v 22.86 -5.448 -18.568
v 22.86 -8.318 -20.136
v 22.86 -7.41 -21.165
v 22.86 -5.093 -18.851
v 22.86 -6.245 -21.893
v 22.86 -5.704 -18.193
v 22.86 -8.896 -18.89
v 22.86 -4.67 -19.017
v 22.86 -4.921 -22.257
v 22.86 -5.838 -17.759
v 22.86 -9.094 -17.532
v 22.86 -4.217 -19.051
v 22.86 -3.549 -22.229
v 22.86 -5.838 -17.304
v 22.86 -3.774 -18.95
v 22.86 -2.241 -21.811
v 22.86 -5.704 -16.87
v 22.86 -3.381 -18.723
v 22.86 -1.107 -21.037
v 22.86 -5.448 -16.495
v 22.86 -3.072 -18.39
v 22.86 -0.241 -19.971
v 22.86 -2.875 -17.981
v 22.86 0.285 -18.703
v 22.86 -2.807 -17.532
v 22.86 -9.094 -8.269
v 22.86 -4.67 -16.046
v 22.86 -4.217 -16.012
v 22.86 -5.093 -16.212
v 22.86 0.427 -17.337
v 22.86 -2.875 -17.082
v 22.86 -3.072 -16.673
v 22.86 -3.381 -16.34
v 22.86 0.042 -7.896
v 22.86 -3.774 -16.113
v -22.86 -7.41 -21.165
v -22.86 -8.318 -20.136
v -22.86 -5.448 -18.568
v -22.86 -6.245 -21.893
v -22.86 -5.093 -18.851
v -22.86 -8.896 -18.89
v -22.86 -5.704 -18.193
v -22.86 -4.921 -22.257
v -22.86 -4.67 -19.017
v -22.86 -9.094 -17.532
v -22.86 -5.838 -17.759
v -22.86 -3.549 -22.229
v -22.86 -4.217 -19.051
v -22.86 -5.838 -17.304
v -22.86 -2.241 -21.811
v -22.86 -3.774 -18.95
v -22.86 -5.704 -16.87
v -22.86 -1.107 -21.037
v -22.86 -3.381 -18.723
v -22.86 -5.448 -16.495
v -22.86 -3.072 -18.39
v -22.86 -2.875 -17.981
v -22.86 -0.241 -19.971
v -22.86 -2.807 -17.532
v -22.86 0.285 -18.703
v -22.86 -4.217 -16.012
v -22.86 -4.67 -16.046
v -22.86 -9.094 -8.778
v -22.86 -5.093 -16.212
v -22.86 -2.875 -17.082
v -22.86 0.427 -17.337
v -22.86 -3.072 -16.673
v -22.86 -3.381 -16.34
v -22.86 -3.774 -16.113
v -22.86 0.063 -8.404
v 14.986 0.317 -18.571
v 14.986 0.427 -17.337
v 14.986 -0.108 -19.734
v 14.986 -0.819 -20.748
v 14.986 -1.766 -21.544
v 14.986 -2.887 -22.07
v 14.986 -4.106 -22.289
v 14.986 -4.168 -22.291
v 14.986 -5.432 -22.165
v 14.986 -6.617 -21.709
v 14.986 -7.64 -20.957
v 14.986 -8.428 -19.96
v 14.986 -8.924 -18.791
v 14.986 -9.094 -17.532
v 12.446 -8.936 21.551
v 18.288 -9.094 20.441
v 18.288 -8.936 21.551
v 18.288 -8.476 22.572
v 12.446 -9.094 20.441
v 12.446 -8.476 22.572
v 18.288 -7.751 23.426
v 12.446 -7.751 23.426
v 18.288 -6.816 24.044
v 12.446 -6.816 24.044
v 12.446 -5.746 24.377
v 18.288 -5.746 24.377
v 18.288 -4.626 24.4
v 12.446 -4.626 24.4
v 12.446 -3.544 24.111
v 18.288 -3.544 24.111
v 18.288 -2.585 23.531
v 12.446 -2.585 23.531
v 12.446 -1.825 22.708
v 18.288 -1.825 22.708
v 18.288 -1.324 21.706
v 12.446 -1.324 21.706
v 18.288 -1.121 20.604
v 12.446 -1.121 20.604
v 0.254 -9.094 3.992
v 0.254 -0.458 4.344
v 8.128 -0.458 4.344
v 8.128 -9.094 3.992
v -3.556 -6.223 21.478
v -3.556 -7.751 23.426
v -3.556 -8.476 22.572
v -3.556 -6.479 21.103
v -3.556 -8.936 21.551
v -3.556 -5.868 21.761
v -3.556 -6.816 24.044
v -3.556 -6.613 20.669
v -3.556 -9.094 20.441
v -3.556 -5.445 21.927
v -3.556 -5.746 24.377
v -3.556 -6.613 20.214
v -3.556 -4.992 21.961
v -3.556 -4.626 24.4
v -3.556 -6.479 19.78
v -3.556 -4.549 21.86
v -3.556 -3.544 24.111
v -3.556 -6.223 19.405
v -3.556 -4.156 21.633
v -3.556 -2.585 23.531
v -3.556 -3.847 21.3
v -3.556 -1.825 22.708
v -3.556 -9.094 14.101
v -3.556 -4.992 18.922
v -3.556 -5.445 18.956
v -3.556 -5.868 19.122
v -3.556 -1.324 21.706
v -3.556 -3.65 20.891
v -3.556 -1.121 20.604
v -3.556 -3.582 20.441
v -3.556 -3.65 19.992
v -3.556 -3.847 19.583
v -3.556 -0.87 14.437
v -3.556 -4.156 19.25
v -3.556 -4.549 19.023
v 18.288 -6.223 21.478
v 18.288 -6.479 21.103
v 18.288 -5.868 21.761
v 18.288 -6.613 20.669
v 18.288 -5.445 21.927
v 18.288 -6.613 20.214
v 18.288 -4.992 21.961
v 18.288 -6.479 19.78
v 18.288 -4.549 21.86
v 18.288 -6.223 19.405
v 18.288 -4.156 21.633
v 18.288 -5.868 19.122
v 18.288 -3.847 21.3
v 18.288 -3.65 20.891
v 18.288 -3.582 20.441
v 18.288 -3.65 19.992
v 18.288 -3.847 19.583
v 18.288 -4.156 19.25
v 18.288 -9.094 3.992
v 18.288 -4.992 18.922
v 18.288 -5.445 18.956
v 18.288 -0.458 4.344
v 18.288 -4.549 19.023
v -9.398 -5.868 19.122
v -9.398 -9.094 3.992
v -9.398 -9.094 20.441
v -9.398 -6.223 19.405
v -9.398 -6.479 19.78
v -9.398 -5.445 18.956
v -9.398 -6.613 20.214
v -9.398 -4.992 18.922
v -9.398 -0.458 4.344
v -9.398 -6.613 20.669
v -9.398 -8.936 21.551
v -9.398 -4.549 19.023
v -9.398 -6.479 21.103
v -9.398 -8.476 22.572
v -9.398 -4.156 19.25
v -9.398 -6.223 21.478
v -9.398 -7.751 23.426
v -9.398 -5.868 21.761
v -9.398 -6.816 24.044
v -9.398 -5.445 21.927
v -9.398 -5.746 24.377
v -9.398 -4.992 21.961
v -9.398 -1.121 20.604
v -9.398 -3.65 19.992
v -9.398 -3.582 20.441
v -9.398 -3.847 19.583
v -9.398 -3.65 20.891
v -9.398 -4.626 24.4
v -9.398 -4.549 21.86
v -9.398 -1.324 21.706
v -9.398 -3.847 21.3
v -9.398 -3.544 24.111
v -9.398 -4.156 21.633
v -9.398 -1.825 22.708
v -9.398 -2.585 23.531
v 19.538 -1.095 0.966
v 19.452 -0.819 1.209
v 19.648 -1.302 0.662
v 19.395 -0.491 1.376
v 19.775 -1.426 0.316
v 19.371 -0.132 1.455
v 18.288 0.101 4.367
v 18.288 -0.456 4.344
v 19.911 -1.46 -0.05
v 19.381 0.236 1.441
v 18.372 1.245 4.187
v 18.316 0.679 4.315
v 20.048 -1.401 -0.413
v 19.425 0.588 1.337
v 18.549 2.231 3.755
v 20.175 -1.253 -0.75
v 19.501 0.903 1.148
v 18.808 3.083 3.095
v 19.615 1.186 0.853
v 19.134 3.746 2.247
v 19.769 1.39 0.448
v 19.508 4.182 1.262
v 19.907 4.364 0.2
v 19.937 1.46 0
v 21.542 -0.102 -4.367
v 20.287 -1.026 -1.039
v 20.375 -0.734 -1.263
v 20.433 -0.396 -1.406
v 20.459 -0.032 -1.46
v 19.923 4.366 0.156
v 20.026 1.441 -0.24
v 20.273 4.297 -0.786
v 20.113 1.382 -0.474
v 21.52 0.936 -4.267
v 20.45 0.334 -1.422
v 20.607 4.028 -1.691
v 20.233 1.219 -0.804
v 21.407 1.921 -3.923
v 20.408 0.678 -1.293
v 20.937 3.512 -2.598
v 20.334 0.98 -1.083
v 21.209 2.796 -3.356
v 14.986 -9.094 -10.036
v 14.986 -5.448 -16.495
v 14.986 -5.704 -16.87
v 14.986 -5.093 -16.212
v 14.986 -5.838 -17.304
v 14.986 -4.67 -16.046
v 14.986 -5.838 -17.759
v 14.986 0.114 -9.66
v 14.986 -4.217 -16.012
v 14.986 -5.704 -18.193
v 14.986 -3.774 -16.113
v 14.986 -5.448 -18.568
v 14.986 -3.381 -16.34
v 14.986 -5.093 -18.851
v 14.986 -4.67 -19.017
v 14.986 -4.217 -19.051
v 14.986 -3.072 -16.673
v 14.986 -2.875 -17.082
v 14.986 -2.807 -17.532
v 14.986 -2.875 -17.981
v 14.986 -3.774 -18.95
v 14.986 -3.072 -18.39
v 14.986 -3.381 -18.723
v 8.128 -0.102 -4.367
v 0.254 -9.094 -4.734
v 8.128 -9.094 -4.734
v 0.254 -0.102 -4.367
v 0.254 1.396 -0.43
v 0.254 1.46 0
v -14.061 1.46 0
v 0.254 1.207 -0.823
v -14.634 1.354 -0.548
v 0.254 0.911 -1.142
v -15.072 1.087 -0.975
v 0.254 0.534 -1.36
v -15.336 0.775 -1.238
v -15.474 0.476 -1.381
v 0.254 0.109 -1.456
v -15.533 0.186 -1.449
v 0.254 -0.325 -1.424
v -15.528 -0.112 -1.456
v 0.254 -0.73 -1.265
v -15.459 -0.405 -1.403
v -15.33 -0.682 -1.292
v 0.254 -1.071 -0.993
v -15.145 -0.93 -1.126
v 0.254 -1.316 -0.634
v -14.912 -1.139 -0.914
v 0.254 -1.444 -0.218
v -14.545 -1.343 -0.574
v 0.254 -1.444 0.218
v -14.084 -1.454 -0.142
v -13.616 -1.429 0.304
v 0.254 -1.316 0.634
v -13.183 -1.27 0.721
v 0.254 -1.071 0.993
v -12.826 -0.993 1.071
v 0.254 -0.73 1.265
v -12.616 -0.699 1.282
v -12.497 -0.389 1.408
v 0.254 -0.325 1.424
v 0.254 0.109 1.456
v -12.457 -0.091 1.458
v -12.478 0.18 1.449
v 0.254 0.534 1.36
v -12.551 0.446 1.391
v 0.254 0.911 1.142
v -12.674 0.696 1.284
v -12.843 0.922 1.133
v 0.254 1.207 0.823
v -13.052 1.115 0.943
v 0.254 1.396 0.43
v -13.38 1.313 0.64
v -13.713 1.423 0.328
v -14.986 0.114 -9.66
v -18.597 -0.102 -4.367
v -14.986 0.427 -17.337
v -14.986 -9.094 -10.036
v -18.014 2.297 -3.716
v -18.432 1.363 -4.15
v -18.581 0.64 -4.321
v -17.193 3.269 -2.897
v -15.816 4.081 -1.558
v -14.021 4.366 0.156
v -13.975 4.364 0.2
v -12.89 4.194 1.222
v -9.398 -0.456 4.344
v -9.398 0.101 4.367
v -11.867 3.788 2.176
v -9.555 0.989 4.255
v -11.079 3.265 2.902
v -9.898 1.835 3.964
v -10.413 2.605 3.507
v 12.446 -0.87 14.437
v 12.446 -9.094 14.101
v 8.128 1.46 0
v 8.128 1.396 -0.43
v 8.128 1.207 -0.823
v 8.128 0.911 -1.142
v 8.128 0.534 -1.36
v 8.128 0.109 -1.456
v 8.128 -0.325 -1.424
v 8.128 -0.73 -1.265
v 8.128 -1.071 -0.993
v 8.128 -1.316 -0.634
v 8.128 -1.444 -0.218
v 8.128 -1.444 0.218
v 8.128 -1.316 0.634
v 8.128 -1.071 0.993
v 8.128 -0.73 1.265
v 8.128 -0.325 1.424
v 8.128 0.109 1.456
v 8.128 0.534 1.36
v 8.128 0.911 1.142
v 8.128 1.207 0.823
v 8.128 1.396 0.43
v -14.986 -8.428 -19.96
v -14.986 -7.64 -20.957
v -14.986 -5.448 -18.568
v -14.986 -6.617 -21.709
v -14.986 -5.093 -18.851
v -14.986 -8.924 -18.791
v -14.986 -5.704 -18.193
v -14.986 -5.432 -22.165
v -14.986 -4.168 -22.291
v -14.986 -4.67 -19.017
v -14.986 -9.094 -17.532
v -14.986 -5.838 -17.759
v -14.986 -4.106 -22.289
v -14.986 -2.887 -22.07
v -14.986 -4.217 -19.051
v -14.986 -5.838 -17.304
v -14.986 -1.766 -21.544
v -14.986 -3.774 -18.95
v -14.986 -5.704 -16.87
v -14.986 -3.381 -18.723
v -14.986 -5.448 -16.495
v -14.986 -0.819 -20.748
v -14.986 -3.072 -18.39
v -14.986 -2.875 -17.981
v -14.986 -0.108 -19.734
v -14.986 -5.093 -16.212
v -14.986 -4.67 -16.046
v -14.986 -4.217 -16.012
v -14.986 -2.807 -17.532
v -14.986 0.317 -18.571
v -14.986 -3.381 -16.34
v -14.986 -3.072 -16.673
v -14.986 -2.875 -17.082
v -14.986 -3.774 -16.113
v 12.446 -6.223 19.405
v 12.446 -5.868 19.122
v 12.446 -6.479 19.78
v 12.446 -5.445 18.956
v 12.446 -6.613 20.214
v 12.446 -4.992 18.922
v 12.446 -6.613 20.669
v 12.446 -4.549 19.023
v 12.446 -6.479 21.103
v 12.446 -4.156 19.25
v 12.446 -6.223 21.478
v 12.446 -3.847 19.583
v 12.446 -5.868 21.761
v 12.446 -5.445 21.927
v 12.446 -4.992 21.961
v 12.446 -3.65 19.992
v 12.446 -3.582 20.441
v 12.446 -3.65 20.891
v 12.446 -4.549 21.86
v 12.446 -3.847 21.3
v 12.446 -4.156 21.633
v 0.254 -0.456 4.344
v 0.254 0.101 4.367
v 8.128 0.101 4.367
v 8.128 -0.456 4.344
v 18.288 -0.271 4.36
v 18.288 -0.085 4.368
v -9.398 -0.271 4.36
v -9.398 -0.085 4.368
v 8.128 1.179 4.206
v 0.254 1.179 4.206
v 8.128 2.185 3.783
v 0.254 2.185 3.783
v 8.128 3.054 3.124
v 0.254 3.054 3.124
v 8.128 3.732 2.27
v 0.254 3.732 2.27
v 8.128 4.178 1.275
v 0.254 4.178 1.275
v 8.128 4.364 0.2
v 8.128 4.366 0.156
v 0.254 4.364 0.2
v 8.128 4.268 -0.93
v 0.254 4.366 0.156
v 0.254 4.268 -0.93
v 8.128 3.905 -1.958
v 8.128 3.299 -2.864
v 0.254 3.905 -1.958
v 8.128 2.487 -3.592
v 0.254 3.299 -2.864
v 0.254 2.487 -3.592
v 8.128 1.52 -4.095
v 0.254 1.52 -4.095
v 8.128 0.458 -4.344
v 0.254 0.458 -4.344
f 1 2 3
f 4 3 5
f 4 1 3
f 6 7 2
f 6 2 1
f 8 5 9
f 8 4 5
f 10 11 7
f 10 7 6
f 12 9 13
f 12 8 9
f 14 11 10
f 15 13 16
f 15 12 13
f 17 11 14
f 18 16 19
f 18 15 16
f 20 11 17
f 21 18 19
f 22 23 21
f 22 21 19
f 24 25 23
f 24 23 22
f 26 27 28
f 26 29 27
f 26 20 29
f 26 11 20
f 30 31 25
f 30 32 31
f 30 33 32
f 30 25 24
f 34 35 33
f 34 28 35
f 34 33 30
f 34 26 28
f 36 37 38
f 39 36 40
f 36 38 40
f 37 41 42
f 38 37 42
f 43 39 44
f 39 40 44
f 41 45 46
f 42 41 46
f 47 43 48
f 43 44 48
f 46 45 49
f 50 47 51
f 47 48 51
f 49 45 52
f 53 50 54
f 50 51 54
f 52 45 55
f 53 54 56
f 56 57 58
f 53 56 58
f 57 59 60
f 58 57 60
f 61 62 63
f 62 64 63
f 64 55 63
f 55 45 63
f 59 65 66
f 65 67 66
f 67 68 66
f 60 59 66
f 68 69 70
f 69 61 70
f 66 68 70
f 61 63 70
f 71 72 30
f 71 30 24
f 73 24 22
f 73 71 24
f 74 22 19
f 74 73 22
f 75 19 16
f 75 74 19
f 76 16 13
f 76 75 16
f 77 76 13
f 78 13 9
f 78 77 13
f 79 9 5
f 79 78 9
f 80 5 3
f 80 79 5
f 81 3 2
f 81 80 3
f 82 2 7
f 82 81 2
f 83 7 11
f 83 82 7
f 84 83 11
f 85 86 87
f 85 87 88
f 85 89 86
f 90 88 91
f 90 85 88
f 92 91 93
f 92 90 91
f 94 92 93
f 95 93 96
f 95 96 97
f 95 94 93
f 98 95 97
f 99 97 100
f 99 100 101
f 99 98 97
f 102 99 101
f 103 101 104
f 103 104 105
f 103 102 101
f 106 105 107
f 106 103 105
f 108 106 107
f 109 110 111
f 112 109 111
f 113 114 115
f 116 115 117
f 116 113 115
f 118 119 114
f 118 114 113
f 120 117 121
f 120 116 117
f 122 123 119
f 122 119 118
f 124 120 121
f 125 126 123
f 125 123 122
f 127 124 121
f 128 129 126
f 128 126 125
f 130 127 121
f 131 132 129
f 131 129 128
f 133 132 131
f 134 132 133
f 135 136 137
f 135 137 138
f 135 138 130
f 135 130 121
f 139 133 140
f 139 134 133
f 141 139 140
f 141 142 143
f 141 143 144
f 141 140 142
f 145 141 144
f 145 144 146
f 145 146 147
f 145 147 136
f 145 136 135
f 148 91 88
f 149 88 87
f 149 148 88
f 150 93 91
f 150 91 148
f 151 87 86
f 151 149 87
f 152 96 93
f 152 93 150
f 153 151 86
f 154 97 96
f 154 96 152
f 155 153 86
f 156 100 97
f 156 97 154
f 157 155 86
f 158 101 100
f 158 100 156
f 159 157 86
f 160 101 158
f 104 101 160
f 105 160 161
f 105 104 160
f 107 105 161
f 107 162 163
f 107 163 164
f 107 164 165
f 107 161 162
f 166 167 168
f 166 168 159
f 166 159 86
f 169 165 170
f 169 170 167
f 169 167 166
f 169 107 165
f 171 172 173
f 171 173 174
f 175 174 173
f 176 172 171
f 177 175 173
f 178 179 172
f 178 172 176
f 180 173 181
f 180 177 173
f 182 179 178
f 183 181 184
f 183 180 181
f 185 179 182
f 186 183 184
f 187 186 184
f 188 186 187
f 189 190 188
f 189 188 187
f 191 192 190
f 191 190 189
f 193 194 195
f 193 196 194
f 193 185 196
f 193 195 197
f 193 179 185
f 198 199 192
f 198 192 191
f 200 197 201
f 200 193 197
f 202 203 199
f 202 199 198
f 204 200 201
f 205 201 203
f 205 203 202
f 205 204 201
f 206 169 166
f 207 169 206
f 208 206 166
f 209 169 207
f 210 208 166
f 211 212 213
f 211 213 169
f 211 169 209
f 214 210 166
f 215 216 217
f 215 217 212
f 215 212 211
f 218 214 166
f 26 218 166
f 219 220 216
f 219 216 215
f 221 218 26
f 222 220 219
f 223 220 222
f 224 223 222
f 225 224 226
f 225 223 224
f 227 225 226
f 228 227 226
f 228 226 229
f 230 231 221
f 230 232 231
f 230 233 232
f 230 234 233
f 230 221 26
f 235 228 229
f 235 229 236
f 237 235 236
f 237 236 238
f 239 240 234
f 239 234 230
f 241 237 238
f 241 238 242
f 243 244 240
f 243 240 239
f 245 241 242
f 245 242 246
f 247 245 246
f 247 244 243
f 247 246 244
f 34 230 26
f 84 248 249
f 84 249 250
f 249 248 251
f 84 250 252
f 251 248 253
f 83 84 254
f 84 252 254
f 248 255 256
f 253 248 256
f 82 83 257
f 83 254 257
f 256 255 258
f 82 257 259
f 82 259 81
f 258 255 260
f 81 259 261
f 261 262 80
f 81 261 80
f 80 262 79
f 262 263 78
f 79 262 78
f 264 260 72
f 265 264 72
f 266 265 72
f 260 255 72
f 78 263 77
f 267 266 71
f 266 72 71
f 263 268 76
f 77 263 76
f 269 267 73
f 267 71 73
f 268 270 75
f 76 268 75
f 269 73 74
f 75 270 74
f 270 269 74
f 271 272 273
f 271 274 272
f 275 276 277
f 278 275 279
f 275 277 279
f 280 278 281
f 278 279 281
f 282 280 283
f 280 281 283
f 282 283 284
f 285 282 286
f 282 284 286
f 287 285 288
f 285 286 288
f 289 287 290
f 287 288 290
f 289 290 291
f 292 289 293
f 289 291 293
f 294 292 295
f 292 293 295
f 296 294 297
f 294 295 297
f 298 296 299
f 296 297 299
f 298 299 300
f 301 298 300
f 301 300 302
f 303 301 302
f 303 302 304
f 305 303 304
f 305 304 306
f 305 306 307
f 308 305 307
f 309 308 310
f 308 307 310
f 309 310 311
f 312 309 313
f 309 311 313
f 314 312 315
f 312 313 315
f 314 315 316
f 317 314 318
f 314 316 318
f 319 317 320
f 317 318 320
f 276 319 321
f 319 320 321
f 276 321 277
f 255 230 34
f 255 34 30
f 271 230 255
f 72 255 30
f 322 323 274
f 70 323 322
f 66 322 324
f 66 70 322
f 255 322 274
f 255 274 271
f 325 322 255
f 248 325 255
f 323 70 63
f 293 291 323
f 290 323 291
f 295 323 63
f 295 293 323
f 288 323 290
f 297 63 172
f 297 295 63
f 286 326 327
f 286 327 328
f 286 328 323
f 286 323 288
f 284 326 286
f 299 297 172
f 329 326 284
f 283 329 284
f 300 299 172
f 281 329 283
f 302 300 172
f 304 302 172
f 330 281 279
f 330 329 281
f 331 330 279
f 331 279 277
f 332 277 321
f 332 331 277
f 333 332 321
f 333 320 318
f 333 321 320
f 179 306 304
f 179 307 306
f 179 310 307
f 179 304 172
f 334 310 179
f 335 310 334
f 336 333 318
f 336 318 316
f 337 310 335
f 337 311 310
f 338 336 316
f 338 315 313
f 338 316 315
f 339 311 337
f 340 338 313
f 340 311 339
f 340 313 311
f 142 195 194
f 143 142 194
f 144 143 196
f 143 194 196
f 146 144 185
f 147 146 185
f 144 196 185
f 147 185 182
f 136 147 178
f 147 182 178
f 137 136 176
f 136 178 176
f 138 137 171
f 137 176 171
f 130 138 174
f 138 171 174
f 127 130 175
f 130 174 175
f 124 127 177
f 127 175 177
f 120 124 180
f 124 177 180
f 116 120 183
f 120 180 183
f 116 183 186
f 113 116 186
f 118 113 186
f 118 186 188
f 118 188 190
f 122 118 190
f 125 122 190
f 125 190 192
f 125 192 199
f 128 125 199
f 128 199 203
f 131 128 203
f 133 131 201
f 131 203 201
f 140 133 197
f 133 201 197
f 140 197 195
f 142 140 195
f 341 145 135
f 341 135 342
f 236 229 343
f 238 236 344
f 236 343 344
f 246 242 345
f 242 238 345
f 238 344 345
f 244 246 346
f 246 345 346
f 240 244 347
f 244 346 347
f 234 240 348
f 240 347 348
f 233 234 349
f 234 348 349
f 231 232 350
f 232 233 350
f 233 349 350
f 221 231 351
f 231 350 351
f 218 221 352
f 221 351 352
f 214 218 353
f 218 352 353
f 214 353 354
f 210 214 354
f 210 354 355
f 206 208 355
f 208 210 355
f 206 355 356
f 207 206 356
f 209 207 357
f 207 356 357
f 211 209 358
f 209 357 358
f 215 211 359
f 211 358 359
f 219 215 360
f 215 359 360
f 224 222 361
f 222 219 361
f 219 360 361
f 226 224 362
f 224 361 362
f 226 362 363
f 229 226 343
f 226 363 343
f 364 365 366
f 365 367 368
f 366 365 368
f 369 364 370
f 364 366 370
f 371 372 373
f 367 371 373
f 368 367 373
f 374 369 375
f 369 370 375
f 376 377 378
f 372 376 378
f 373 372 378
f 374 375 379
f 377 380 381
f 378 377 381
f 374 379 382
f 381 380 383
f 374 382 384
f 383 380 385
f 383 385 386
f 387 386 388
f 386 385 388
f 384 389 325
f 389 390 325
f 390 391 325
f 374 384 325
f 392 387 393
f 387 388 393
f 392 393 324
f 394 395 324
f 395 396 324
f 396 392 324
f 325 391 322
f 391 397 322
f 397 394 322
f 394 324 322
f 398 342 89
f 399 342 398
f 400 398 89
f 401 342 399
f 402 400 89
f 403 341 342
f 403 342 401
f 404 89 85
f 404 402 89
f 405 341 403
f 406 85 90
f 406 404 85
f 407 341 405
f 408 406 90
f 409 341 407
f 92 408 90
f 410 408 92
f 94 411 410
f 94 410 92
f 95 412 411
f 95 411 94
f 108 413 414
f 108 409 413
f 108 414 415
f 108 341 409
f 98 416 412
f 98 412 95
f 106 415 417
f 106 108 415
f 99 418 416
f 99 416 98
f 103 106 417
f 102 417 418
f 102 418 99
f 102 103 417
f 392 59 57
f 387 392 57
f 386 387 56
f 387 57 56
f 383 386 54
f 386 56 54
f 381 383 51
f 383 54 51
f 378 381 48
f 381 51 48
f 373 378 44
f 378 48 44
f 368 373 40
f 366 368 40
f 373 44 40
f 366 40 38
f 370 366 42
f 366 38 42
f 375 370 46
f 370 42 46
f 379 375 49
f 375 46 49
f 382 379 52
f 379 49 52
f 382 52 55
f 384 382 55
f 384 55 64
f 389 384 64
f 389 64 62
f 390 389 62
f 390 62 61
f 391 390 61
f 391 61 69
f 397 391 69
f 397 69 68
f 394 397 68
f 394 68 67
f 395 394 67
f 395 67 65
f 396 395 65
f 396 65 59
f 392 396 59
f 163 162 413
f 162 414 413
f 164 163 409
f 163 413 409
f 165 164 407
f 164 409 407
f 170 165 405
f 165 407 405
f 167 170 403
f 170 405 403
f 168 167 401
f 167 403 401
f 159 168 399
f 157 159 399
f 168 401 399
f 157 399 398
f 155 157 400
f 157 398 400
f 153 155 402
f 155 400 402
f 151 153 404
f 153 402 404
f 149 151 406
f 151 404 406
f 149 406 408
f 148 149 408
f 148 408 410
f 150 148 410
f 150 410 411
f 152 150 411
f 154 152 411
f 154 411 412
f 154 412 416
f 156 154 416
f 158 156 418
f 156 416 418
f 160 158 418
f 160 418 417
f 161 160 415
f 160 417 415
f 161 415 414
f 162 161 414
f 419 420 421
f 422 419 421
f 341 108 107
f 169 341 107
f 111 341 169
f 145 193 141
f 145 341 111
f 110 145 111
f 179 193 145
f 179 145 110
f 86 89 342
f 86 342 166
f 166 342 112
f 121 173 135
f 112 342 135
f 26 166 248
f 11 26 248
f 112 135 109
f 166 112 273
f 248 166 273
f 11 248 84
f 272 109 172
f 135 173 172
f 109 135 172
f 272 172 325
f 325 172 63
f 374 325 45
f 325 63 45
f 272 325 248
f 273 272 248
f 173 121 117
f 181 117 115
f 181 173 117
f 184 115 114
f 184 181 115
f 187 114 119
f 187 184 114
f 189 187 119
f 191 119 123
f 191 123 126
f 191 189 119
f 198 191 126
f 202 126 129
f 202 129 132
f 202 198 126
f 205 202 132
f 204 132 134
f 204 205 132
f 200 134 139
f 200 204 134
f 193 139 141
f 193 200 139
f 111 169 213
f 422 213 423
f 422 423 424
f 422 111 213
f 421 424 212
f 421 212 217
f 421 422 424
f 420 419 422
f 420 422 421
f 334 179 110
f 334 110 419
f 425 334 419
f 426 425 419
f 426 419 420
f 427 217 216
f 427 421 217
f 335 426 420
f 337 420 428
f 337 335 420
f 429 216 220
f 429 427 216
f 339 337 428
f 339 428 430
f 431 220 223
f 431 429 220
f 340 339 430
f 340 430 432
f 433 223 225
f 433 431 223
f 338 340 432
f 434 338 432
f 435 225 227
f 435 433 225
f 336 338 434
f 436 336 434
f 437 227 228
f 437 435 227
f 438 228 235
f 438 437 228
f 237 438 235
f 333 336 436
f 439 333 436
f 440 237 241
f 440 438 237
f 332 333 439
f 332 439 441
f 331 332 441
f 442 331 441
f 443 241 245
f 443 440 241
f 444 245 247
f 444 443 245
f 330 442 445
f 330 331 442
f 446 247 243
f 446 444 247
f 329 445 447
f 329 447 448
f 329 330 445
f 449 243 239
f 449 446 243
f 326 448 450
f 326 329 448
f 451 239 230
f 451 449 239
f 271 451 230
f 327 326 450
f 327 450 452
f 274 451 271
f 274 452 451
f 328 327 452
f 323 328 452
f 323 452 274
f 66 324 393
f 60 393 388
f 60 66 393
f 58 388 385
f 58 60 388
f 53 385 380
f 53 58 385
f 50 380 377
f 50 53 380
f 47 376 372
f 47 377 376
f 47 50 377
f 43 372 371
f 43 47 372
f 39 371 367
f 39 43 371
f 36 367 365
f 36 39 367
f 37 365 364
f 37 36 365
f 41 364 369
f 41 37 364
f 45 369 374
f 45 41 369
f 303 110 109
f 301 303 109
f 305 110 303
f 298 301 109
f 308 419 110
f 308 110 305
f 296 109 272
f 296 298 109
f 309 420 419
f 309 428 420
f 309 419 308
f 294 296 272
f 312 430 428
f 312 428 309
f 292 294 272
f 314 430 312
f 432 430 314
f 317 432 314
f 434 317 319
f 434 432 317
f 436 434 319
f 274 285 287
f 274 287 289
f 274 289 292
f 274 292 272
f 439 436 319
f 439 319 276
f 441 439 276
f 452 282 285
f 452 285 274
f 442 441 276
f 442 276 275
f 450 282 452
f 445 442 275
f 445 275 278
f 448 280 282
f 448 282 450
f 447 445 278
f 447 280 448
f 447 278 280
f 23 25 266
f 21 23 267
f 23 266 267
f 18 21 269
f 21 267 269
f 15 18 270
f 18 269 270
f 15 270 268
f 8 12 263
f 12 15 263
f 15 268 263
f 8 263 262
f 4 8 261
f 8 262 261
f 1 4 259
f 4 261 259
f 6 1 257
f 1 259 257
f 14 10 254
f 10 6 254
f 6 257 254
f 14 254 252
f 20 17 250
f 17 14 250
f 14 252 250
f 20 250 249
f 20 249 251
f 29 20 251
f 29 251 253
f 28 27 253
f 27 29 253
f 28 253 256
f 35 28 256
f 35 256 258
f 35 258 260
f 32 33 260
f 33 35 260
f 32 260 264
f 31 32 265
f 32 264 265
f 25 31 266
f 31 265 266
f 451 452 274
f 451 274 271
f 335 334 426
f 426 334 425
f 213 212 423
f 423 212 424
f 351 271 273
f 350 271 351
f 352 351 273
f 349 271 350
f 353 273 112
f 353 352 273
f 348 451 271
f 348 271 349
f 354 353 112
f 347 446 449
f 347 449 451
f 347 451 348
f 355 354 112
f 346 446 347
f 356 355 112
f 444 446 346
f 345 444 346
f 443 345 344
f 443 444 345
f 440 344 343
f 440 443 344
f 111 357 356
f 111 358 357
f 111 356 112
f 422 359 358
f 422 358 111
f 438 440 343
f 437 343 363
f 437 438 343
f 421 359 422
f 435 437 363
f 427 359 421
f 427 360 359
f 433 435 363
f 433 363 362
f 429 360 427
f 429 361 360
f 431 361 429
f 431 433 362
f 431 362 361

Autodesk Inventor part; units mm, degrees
sketch "Sketch3" plane through (0, 0, 0) normal (1, 0, 0) x (0, 1, 0)
  arc A0 (-1.1214, 20.6041) -> (-9.0936, 20.4414) centre (-5.1058, 20.4414) ccw
  circle A1 centre (-5.1058, 20.4414) radius 1.524
  arc A2 (-9.0936, -17.5316) -> (0.4274, -17.3373) centre (-4.3311, -17.5316) ccw
  circle A3 centre (-4.3311, -17.5316) radius 1.524
  arc A4 (-0.102, -4.3672) -> (-0.4576, 4.3443) centre (0, 0) ccw
  circle A5 centre (0, 0) radius 1.4605
  line L0 (-9.0936, 20.4414) -> (-9.0936, -17.5316)
  line L1 (-1.1214, 20.6041) -> (-0.4576, 4.3443)
  line L2 (-0.102, -4.3672) -> (0.4274, -17.3373)
  line L3 (0, 0) -> (0, 35.9976) construction
  line L4 (0, 0) -> (20.0348, 0) construction
  line L5 (9.2339, 18.9174) -> (-10.5183, 18.9174) construction
  line L6 (11.5384, -16.0076) -> (-16.1147, -16.0076) construction
  line L7 (4.3684, 5.3055) -> (4.3684, -5.6899) construction
  line L8 (-1.4605, 3.5835) -> (-1.4605, -5.6899) construction
  dimension "d5" = 2.921
  dimension "d38" = 3.048
  dimension "d39" = 3.9878
  dimension "d40" = 4.7625
  dimension "d41" = 34.925
  dimension "d42" = 13.462
  dimension "d43" = 8.636
  dimension "d44" = 8.9916
  dimension "d45" = 7.6331
extrude "Extrusion1" add sketch "Sketch3" along normal mid plane 45.72
ref_plane "Work Plane1" through (0, 4.3647, 0.1782) normal (0, 0.9991679, 0.0407857) x (-1, 0, 0)
sketch "Sketch5" plane through (0, 4.3647, 0.1782) normal (0, 0.9991679, 0.0407857) x (-1, 0, 0)
  line L0 (-22.86, -7.8915) -> (-22.86, 24.6205)
  line L1 (-22.86, 24.6205) -> (-18.288, 24.6205)
  line L2 (-18.288, 24.6205) -> (-18.288, 4.3594)
  line L3 (-18.288, 4.3594) -> (-22.86, -7.8915)
  line L4 (-22.86, 20.6327) -> (-22.86, 4.3594) projected
  line L5 (22.86, 0) -> (-22.86, 0) projected
  line L6 (22.86, 24.6205) -> (-22.86, 24.6205) projected
  line L7 (22.86, 4.3594) -> (-22.86, 4.3594) projected
  line L8 (-22.86, 4.3594) -> (-22.86, -4.3594) projected
  line L9 (22.86, -4.3594) -> (-22.86, -4.3594) projected
  line L10 (22.86, -4.3594) -> (22.86, 4.3594) projected
  line L11 (22.86, 4.3594) -> (-22.86, 4.3594) projected
  line L12 (22.86, 24.6205) -> (22.86, -8.3995)
  line L13 (22.86, -8.3995) -> (9.398, 4.3594)
  line L14 (9.398, 4.3594) -> (9.398, 24.6205)
  line L15 (22.86, -22.1028) -> (-22.86, -22.1028) projected
  line L16 (14.986, -9.6568) -> (-14.986, -9.6568)
  line L17 (-14.986, -9.6568) -> (-14.986, -22.1028)
  line L18 (-14.986, -22.1028) -> (14.986, -22.1028)
  line L19 (14.986, -22.1028) -> (14.986, -9.6568)
  line L20 (3.556, 14.4605) -> (-12.446, 14.4605)
  line L21 (-12.446, 14.4605) -> (-12.446, 24.6205)
  line L22 (-12.446, 24.6205) -> (3.556, 24.6205)
  line L23 (3.556, 24.6205) -> (3.556, 14.4605)
  line L24 (-22.86, -4.3594) -> (-22.86, -17.3403) projected
  line L25 (22.86, -17.3403) -> (22.86, -4.3594) projected
  line L26 (-8.128, 4.3594) -> (-0.254, 4.3594)
  line L27 (-0.254, 4.3594) -> (-0.254, -4.3594)
  line L28 (-0.254, -4.3594) -> (-8.128, -4.3594)
  line L29 (-8.128, -4.3594) -> (-8.128, 4.3594)
  point P0 (0, 0)
  dimension "d21" = 32.512
  dimension "d22" = 4.572
  dimension "d26" = 33.02
  dimension "d27" = 5.842
  dimension "d28" = 5.842
  dimension "d29" = 10.16
  dimension "d31" = 12.446
  dimension "d32" = 7.874
  dimension "d33" = 7.874
  dimension "d34" = 10.16
  dimension "d36" = 29.972
  dimension "d37" = 16.002
extrude "Extrusion2" cut sketch "Sketch5" against normal up to surface contours L0 L9 L3 | L0 L5 L3 L9 | L0 L7 L3 L5 | L29 L5 L27 L9 | L0 L1 L2 L7 | L29 L7 L27 L5 | L13 L5 L10 L9 | L9 L12 L13 | L6 L23 L20 L21 | L13 L7 L10 L5 | L14 L6 L12 L7 | L15 L17 L16 L19 surface through (0, -9.0936, -17.5316) normal (0, -1, 0)
ref_plane "Work Plane2" through (0, -5.1058, 24.4292) normal (0, 0, 1) x (1, 0, 0)
ref_plane "Work Plane3" through (0, -4.3311, -22.2941) normal (0, 0, 1) x (1, 0, 0)
properties part number "Transmission Plate - Top"
